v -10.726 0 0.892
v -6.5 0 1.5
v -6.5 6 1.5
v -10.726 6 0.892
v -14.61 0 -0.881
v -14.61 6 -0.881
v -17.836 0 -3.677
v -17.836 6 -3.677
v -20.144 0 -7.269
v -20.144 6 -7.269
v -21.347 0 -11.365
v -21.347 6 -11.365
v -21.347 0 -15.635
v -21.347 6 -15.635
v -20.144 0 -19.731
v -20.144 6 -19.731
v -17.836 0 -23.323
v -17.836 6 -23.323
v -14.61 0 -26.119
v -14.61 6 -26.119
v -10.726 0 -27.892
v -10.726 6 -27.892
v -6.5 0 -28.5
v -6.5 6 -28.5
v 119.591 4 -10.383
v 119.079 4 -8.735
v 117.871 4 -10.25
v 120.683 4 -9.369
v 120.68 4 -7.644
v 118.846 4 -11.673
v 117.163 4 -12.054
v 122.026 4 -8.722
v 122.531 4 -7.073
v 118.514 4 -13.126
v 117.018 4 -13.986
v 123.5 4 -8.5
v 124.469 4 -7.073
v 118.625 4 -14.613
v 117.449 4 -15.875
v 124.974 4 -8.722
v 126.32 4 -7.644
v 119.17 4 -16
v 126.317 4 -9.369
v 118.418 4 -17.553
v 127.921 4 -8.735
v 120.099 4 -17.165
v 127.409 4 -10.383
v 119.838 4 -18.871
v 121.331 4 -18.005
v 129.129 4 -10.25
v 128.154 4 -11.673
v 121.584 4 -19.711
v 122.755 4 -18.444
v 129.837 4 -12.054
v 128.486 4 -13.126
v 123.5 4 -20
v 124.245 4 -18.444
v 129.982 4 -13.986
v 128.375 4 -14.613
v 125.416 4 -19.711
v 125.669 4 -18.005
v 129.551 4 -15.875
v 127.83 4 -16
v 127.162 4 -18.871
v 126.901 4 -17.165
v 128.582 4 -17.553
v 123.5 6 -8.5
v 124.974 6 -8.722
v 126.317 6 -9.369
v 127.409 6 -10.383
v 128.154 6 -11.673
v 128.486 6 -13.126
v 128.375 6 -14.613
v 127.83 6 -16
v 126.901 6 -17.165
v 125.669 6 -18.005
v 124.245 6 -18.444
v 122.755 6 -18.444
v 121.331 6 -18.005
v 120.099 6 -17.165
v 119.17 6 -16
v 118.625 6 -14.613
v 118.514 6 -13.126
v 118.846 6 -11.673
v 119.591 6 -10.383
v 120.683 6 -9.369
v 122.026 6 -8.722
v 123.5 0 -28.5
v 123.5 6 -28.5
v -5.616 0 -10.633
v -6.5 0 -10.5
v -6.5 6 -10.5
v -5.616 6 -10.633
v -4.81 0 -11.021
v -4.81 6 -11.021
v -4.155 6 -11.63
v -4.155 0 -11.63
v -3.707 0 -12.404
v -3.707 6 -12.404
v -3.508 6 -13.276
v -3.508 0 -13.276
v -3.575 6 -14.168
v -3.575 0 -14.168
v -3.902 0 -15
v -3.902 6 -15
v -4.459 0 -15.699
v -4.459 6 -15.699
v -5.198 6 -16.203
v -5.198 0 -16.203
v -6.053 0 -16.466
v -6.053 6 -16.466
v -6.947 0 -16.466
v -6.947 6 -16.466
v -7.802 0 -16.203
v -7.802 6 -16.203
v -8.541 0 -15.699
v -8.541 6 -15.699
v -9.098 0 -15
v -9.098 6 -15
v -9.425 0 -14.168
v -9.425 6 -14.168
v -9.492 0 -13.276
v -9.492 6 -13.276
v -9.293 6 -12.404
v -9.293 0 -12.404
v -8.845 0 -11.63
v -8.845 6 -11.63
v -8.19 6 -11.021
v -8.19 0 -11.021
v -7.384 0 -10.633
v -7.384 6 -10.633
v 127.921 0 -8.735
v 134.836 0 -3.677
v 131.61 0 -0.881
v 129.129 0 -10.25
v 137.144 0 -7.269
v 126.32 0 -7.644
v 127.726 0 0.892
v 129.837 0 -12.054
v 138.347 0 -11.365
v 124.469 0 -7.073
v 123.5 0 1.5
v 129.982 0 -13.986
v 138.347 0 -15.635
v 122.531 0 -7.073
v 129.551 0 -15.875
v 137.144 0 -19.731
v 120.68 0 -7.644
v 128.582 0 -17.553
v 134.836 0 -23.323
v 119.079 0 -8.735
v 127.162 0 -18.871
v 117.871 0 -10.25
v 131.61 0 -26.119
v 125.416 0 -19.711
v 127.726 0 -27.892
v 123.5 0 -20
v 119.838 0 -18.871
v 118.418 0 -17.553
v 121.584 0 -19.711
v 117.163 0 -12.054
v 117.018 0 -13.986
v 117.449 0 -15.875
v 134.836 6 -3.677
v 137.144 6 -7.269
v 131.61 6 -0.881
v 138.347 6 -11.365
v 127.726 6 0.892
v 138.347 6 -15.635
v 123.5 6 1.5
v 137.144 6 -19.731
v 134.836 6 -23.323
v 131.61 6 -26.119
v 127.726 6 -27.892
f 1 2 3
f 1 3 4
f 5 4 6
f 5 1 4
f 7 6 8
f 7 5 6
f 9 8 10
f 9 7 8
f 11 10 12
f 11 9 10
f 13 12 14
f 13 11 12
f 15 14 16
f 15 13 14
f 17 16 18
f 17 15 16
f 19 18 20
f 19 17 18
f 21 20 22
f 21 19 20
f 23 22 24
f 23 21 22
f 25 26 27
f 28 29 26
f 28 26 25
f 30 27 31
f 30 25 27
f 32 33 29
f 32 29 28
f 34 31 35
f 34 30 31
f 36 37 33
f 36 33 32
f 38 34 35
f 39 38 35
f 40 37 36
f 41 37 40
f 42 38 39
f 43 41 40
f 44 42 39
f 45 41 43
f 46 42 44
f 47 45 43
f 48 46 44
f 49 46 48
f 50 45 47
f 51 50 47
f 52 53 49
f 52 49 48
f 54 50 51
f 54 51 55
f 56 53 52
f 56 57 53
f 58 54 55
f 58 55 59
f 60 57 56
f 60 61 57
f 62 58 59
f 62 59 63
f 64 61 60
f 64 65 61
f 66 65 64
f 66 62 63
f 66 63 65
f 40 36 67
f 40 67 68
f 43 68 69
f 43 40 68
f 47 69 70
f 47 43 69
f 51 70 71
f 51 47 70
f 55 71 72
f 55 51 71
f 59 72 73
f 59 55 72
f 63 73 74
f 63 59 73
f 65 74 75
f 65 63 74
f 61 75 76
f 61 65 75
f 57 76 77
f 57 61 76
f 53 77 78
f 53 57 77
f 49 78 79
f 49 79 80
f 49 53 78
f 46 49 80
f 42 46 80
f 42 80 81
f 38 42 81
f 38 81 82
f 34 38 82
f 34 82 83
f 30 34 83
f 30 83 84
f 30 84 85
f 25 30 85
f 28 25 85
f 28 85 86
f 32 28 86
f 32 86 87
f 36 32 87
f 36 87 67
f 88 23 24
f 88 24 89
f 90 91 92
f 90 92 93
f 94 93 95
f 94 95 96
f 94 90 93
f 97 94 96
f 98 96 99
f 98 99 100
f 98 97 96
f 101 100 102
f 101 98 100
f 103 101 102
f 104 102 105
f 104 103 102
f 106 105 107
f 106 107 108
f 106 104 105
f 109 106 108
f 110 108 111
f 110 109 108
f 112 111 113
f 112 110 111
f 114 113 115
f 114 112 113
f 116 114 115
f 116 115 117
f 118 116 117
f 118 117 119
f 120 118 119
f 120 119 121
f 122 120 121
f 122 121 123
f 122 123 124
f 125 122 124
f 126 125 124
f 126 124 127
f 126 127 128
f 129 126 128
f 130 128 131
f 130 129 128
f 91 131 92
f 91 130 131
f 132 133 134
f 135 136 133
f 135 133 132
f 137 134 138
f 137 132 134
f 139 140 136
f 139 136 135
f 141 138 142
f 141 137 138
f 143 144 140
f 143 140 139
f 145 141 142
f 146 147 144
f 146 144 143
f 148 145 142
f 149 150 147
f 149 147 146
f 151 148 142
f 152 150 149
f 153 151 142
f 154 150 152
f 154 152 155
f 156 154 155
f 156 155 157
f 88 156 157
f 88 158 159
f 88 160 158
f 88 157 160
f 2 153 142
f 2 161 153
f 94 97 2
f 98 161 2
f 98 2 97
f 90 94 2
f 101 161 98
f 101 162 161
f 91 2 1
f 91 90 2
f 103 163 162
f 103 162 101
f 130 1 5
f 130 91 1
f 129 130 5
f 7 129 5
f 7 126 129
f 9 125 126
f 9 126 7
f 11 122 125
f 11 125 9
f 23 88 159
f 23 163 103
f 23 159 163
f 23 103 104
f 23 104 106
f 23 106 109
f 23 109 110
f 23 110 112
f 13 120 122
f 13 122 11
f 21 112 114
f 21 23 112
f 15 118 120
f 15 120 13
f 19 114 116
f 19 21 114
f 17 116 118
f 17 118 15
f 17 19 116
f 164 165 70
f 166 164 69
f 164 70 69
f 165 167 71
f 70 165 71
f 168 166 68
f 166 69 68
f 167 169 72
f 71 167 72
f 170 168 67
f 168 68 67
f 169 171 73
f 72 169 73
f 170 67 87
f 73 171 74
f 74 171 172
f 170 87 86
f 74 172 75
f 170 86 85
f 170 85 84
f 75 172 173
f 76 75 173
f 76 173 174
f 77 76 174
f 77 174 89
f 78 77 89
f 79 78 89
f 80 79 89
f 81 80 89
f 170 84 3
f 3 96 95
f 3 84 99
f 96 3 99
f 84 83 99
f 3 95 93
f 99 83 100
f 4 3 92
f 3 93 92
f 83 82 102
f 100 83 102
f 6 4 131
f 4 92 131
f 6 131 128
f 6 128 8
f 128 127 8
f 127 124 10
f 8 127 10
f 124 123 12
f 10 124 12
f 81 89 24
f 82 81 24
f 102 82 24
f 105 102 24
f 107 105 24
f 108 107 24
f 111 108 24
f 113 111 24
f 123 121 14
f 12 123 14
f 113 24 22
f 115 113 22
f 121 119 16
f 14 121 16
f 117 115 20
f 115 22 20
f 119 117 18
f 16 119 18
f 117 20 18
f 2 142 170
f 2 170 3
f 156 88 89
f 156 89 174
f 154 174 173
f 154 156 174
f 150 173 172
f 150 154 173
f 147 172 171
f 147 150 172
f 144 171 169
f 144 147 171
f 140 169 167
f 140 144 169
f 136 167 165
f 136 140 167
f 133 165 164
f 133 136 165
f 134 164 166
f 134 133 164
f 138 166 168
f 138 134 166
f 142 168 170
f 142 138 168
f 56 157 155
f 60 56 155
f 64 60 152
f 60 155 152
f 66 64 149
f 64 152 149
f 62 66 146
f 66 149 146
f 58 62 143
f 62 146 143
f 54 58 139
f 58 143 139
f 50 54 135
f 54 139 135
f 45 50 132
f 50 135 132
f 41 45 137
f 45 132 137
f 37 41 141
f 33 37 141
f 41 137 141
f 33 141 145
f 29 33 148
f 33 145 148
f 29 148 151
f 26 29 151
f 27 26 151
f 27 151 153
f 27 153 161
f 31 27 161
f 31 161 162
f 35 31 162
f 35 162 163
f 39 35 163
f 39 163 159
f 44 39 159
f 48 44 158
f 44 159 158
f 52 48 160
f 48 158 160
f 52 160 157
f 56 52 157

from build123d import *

# Parameters (mm, degrees)
SKETCH2_R           = 3
SKETCH2_R_2         = 5
BOSS_EXTRUDE1_DEPTH = 6
SKETCH4_R           = 6.5
CUT_EXTRUDE1_DEPTH  = 4


with BuildPart() as part:
    # Sketch2 → Boss-Extrude1 (new body)
    with BuildSketch(Plane(origin=(0, 0, 0), x_dir=(1, 0, 0), z_dir=(0, 1, 0))):
        with BuildLine():
            Line((-6.5, 28.5), (123.5, 28.5))
            ThreePointArc((123.5, 28.5), (138.5, 13.5), (123.5, -1.5))
            Line((123.5, -1.5), (-6.5, -1.5))
            ThreePointArc((-6.5, -1.5), (-21.5, 13.5), (-6.5, 28.5))
        make_face()
        with Locations(Location((-6.5, 13.5, 0), (0, 0, 270))):
            Circle(SKETCH2_R, mode=Mode.SUBTRACT)
        with Locations(Location((123.5, 13.5, 0), (0, 0, 270))):
            Circle(SKETCH2_R_2, mode=Mode.SUBTRACT)
    extrude(amount=BOSS_EXTRUDE1_DEPTH)

    # Sketch4 → Cut-Extrude1 (cut)
    with BuildSketch(Plane.XZ):
        with Locations(Location((123.5, -13.5, 0), (0, 0, 270))):
            Circle(SKETCH4_R)
    extrude(amount=-CUT_EXTRUDE1_DEPTH, mode=Mode.SUBTRACT)


solid = part.part
